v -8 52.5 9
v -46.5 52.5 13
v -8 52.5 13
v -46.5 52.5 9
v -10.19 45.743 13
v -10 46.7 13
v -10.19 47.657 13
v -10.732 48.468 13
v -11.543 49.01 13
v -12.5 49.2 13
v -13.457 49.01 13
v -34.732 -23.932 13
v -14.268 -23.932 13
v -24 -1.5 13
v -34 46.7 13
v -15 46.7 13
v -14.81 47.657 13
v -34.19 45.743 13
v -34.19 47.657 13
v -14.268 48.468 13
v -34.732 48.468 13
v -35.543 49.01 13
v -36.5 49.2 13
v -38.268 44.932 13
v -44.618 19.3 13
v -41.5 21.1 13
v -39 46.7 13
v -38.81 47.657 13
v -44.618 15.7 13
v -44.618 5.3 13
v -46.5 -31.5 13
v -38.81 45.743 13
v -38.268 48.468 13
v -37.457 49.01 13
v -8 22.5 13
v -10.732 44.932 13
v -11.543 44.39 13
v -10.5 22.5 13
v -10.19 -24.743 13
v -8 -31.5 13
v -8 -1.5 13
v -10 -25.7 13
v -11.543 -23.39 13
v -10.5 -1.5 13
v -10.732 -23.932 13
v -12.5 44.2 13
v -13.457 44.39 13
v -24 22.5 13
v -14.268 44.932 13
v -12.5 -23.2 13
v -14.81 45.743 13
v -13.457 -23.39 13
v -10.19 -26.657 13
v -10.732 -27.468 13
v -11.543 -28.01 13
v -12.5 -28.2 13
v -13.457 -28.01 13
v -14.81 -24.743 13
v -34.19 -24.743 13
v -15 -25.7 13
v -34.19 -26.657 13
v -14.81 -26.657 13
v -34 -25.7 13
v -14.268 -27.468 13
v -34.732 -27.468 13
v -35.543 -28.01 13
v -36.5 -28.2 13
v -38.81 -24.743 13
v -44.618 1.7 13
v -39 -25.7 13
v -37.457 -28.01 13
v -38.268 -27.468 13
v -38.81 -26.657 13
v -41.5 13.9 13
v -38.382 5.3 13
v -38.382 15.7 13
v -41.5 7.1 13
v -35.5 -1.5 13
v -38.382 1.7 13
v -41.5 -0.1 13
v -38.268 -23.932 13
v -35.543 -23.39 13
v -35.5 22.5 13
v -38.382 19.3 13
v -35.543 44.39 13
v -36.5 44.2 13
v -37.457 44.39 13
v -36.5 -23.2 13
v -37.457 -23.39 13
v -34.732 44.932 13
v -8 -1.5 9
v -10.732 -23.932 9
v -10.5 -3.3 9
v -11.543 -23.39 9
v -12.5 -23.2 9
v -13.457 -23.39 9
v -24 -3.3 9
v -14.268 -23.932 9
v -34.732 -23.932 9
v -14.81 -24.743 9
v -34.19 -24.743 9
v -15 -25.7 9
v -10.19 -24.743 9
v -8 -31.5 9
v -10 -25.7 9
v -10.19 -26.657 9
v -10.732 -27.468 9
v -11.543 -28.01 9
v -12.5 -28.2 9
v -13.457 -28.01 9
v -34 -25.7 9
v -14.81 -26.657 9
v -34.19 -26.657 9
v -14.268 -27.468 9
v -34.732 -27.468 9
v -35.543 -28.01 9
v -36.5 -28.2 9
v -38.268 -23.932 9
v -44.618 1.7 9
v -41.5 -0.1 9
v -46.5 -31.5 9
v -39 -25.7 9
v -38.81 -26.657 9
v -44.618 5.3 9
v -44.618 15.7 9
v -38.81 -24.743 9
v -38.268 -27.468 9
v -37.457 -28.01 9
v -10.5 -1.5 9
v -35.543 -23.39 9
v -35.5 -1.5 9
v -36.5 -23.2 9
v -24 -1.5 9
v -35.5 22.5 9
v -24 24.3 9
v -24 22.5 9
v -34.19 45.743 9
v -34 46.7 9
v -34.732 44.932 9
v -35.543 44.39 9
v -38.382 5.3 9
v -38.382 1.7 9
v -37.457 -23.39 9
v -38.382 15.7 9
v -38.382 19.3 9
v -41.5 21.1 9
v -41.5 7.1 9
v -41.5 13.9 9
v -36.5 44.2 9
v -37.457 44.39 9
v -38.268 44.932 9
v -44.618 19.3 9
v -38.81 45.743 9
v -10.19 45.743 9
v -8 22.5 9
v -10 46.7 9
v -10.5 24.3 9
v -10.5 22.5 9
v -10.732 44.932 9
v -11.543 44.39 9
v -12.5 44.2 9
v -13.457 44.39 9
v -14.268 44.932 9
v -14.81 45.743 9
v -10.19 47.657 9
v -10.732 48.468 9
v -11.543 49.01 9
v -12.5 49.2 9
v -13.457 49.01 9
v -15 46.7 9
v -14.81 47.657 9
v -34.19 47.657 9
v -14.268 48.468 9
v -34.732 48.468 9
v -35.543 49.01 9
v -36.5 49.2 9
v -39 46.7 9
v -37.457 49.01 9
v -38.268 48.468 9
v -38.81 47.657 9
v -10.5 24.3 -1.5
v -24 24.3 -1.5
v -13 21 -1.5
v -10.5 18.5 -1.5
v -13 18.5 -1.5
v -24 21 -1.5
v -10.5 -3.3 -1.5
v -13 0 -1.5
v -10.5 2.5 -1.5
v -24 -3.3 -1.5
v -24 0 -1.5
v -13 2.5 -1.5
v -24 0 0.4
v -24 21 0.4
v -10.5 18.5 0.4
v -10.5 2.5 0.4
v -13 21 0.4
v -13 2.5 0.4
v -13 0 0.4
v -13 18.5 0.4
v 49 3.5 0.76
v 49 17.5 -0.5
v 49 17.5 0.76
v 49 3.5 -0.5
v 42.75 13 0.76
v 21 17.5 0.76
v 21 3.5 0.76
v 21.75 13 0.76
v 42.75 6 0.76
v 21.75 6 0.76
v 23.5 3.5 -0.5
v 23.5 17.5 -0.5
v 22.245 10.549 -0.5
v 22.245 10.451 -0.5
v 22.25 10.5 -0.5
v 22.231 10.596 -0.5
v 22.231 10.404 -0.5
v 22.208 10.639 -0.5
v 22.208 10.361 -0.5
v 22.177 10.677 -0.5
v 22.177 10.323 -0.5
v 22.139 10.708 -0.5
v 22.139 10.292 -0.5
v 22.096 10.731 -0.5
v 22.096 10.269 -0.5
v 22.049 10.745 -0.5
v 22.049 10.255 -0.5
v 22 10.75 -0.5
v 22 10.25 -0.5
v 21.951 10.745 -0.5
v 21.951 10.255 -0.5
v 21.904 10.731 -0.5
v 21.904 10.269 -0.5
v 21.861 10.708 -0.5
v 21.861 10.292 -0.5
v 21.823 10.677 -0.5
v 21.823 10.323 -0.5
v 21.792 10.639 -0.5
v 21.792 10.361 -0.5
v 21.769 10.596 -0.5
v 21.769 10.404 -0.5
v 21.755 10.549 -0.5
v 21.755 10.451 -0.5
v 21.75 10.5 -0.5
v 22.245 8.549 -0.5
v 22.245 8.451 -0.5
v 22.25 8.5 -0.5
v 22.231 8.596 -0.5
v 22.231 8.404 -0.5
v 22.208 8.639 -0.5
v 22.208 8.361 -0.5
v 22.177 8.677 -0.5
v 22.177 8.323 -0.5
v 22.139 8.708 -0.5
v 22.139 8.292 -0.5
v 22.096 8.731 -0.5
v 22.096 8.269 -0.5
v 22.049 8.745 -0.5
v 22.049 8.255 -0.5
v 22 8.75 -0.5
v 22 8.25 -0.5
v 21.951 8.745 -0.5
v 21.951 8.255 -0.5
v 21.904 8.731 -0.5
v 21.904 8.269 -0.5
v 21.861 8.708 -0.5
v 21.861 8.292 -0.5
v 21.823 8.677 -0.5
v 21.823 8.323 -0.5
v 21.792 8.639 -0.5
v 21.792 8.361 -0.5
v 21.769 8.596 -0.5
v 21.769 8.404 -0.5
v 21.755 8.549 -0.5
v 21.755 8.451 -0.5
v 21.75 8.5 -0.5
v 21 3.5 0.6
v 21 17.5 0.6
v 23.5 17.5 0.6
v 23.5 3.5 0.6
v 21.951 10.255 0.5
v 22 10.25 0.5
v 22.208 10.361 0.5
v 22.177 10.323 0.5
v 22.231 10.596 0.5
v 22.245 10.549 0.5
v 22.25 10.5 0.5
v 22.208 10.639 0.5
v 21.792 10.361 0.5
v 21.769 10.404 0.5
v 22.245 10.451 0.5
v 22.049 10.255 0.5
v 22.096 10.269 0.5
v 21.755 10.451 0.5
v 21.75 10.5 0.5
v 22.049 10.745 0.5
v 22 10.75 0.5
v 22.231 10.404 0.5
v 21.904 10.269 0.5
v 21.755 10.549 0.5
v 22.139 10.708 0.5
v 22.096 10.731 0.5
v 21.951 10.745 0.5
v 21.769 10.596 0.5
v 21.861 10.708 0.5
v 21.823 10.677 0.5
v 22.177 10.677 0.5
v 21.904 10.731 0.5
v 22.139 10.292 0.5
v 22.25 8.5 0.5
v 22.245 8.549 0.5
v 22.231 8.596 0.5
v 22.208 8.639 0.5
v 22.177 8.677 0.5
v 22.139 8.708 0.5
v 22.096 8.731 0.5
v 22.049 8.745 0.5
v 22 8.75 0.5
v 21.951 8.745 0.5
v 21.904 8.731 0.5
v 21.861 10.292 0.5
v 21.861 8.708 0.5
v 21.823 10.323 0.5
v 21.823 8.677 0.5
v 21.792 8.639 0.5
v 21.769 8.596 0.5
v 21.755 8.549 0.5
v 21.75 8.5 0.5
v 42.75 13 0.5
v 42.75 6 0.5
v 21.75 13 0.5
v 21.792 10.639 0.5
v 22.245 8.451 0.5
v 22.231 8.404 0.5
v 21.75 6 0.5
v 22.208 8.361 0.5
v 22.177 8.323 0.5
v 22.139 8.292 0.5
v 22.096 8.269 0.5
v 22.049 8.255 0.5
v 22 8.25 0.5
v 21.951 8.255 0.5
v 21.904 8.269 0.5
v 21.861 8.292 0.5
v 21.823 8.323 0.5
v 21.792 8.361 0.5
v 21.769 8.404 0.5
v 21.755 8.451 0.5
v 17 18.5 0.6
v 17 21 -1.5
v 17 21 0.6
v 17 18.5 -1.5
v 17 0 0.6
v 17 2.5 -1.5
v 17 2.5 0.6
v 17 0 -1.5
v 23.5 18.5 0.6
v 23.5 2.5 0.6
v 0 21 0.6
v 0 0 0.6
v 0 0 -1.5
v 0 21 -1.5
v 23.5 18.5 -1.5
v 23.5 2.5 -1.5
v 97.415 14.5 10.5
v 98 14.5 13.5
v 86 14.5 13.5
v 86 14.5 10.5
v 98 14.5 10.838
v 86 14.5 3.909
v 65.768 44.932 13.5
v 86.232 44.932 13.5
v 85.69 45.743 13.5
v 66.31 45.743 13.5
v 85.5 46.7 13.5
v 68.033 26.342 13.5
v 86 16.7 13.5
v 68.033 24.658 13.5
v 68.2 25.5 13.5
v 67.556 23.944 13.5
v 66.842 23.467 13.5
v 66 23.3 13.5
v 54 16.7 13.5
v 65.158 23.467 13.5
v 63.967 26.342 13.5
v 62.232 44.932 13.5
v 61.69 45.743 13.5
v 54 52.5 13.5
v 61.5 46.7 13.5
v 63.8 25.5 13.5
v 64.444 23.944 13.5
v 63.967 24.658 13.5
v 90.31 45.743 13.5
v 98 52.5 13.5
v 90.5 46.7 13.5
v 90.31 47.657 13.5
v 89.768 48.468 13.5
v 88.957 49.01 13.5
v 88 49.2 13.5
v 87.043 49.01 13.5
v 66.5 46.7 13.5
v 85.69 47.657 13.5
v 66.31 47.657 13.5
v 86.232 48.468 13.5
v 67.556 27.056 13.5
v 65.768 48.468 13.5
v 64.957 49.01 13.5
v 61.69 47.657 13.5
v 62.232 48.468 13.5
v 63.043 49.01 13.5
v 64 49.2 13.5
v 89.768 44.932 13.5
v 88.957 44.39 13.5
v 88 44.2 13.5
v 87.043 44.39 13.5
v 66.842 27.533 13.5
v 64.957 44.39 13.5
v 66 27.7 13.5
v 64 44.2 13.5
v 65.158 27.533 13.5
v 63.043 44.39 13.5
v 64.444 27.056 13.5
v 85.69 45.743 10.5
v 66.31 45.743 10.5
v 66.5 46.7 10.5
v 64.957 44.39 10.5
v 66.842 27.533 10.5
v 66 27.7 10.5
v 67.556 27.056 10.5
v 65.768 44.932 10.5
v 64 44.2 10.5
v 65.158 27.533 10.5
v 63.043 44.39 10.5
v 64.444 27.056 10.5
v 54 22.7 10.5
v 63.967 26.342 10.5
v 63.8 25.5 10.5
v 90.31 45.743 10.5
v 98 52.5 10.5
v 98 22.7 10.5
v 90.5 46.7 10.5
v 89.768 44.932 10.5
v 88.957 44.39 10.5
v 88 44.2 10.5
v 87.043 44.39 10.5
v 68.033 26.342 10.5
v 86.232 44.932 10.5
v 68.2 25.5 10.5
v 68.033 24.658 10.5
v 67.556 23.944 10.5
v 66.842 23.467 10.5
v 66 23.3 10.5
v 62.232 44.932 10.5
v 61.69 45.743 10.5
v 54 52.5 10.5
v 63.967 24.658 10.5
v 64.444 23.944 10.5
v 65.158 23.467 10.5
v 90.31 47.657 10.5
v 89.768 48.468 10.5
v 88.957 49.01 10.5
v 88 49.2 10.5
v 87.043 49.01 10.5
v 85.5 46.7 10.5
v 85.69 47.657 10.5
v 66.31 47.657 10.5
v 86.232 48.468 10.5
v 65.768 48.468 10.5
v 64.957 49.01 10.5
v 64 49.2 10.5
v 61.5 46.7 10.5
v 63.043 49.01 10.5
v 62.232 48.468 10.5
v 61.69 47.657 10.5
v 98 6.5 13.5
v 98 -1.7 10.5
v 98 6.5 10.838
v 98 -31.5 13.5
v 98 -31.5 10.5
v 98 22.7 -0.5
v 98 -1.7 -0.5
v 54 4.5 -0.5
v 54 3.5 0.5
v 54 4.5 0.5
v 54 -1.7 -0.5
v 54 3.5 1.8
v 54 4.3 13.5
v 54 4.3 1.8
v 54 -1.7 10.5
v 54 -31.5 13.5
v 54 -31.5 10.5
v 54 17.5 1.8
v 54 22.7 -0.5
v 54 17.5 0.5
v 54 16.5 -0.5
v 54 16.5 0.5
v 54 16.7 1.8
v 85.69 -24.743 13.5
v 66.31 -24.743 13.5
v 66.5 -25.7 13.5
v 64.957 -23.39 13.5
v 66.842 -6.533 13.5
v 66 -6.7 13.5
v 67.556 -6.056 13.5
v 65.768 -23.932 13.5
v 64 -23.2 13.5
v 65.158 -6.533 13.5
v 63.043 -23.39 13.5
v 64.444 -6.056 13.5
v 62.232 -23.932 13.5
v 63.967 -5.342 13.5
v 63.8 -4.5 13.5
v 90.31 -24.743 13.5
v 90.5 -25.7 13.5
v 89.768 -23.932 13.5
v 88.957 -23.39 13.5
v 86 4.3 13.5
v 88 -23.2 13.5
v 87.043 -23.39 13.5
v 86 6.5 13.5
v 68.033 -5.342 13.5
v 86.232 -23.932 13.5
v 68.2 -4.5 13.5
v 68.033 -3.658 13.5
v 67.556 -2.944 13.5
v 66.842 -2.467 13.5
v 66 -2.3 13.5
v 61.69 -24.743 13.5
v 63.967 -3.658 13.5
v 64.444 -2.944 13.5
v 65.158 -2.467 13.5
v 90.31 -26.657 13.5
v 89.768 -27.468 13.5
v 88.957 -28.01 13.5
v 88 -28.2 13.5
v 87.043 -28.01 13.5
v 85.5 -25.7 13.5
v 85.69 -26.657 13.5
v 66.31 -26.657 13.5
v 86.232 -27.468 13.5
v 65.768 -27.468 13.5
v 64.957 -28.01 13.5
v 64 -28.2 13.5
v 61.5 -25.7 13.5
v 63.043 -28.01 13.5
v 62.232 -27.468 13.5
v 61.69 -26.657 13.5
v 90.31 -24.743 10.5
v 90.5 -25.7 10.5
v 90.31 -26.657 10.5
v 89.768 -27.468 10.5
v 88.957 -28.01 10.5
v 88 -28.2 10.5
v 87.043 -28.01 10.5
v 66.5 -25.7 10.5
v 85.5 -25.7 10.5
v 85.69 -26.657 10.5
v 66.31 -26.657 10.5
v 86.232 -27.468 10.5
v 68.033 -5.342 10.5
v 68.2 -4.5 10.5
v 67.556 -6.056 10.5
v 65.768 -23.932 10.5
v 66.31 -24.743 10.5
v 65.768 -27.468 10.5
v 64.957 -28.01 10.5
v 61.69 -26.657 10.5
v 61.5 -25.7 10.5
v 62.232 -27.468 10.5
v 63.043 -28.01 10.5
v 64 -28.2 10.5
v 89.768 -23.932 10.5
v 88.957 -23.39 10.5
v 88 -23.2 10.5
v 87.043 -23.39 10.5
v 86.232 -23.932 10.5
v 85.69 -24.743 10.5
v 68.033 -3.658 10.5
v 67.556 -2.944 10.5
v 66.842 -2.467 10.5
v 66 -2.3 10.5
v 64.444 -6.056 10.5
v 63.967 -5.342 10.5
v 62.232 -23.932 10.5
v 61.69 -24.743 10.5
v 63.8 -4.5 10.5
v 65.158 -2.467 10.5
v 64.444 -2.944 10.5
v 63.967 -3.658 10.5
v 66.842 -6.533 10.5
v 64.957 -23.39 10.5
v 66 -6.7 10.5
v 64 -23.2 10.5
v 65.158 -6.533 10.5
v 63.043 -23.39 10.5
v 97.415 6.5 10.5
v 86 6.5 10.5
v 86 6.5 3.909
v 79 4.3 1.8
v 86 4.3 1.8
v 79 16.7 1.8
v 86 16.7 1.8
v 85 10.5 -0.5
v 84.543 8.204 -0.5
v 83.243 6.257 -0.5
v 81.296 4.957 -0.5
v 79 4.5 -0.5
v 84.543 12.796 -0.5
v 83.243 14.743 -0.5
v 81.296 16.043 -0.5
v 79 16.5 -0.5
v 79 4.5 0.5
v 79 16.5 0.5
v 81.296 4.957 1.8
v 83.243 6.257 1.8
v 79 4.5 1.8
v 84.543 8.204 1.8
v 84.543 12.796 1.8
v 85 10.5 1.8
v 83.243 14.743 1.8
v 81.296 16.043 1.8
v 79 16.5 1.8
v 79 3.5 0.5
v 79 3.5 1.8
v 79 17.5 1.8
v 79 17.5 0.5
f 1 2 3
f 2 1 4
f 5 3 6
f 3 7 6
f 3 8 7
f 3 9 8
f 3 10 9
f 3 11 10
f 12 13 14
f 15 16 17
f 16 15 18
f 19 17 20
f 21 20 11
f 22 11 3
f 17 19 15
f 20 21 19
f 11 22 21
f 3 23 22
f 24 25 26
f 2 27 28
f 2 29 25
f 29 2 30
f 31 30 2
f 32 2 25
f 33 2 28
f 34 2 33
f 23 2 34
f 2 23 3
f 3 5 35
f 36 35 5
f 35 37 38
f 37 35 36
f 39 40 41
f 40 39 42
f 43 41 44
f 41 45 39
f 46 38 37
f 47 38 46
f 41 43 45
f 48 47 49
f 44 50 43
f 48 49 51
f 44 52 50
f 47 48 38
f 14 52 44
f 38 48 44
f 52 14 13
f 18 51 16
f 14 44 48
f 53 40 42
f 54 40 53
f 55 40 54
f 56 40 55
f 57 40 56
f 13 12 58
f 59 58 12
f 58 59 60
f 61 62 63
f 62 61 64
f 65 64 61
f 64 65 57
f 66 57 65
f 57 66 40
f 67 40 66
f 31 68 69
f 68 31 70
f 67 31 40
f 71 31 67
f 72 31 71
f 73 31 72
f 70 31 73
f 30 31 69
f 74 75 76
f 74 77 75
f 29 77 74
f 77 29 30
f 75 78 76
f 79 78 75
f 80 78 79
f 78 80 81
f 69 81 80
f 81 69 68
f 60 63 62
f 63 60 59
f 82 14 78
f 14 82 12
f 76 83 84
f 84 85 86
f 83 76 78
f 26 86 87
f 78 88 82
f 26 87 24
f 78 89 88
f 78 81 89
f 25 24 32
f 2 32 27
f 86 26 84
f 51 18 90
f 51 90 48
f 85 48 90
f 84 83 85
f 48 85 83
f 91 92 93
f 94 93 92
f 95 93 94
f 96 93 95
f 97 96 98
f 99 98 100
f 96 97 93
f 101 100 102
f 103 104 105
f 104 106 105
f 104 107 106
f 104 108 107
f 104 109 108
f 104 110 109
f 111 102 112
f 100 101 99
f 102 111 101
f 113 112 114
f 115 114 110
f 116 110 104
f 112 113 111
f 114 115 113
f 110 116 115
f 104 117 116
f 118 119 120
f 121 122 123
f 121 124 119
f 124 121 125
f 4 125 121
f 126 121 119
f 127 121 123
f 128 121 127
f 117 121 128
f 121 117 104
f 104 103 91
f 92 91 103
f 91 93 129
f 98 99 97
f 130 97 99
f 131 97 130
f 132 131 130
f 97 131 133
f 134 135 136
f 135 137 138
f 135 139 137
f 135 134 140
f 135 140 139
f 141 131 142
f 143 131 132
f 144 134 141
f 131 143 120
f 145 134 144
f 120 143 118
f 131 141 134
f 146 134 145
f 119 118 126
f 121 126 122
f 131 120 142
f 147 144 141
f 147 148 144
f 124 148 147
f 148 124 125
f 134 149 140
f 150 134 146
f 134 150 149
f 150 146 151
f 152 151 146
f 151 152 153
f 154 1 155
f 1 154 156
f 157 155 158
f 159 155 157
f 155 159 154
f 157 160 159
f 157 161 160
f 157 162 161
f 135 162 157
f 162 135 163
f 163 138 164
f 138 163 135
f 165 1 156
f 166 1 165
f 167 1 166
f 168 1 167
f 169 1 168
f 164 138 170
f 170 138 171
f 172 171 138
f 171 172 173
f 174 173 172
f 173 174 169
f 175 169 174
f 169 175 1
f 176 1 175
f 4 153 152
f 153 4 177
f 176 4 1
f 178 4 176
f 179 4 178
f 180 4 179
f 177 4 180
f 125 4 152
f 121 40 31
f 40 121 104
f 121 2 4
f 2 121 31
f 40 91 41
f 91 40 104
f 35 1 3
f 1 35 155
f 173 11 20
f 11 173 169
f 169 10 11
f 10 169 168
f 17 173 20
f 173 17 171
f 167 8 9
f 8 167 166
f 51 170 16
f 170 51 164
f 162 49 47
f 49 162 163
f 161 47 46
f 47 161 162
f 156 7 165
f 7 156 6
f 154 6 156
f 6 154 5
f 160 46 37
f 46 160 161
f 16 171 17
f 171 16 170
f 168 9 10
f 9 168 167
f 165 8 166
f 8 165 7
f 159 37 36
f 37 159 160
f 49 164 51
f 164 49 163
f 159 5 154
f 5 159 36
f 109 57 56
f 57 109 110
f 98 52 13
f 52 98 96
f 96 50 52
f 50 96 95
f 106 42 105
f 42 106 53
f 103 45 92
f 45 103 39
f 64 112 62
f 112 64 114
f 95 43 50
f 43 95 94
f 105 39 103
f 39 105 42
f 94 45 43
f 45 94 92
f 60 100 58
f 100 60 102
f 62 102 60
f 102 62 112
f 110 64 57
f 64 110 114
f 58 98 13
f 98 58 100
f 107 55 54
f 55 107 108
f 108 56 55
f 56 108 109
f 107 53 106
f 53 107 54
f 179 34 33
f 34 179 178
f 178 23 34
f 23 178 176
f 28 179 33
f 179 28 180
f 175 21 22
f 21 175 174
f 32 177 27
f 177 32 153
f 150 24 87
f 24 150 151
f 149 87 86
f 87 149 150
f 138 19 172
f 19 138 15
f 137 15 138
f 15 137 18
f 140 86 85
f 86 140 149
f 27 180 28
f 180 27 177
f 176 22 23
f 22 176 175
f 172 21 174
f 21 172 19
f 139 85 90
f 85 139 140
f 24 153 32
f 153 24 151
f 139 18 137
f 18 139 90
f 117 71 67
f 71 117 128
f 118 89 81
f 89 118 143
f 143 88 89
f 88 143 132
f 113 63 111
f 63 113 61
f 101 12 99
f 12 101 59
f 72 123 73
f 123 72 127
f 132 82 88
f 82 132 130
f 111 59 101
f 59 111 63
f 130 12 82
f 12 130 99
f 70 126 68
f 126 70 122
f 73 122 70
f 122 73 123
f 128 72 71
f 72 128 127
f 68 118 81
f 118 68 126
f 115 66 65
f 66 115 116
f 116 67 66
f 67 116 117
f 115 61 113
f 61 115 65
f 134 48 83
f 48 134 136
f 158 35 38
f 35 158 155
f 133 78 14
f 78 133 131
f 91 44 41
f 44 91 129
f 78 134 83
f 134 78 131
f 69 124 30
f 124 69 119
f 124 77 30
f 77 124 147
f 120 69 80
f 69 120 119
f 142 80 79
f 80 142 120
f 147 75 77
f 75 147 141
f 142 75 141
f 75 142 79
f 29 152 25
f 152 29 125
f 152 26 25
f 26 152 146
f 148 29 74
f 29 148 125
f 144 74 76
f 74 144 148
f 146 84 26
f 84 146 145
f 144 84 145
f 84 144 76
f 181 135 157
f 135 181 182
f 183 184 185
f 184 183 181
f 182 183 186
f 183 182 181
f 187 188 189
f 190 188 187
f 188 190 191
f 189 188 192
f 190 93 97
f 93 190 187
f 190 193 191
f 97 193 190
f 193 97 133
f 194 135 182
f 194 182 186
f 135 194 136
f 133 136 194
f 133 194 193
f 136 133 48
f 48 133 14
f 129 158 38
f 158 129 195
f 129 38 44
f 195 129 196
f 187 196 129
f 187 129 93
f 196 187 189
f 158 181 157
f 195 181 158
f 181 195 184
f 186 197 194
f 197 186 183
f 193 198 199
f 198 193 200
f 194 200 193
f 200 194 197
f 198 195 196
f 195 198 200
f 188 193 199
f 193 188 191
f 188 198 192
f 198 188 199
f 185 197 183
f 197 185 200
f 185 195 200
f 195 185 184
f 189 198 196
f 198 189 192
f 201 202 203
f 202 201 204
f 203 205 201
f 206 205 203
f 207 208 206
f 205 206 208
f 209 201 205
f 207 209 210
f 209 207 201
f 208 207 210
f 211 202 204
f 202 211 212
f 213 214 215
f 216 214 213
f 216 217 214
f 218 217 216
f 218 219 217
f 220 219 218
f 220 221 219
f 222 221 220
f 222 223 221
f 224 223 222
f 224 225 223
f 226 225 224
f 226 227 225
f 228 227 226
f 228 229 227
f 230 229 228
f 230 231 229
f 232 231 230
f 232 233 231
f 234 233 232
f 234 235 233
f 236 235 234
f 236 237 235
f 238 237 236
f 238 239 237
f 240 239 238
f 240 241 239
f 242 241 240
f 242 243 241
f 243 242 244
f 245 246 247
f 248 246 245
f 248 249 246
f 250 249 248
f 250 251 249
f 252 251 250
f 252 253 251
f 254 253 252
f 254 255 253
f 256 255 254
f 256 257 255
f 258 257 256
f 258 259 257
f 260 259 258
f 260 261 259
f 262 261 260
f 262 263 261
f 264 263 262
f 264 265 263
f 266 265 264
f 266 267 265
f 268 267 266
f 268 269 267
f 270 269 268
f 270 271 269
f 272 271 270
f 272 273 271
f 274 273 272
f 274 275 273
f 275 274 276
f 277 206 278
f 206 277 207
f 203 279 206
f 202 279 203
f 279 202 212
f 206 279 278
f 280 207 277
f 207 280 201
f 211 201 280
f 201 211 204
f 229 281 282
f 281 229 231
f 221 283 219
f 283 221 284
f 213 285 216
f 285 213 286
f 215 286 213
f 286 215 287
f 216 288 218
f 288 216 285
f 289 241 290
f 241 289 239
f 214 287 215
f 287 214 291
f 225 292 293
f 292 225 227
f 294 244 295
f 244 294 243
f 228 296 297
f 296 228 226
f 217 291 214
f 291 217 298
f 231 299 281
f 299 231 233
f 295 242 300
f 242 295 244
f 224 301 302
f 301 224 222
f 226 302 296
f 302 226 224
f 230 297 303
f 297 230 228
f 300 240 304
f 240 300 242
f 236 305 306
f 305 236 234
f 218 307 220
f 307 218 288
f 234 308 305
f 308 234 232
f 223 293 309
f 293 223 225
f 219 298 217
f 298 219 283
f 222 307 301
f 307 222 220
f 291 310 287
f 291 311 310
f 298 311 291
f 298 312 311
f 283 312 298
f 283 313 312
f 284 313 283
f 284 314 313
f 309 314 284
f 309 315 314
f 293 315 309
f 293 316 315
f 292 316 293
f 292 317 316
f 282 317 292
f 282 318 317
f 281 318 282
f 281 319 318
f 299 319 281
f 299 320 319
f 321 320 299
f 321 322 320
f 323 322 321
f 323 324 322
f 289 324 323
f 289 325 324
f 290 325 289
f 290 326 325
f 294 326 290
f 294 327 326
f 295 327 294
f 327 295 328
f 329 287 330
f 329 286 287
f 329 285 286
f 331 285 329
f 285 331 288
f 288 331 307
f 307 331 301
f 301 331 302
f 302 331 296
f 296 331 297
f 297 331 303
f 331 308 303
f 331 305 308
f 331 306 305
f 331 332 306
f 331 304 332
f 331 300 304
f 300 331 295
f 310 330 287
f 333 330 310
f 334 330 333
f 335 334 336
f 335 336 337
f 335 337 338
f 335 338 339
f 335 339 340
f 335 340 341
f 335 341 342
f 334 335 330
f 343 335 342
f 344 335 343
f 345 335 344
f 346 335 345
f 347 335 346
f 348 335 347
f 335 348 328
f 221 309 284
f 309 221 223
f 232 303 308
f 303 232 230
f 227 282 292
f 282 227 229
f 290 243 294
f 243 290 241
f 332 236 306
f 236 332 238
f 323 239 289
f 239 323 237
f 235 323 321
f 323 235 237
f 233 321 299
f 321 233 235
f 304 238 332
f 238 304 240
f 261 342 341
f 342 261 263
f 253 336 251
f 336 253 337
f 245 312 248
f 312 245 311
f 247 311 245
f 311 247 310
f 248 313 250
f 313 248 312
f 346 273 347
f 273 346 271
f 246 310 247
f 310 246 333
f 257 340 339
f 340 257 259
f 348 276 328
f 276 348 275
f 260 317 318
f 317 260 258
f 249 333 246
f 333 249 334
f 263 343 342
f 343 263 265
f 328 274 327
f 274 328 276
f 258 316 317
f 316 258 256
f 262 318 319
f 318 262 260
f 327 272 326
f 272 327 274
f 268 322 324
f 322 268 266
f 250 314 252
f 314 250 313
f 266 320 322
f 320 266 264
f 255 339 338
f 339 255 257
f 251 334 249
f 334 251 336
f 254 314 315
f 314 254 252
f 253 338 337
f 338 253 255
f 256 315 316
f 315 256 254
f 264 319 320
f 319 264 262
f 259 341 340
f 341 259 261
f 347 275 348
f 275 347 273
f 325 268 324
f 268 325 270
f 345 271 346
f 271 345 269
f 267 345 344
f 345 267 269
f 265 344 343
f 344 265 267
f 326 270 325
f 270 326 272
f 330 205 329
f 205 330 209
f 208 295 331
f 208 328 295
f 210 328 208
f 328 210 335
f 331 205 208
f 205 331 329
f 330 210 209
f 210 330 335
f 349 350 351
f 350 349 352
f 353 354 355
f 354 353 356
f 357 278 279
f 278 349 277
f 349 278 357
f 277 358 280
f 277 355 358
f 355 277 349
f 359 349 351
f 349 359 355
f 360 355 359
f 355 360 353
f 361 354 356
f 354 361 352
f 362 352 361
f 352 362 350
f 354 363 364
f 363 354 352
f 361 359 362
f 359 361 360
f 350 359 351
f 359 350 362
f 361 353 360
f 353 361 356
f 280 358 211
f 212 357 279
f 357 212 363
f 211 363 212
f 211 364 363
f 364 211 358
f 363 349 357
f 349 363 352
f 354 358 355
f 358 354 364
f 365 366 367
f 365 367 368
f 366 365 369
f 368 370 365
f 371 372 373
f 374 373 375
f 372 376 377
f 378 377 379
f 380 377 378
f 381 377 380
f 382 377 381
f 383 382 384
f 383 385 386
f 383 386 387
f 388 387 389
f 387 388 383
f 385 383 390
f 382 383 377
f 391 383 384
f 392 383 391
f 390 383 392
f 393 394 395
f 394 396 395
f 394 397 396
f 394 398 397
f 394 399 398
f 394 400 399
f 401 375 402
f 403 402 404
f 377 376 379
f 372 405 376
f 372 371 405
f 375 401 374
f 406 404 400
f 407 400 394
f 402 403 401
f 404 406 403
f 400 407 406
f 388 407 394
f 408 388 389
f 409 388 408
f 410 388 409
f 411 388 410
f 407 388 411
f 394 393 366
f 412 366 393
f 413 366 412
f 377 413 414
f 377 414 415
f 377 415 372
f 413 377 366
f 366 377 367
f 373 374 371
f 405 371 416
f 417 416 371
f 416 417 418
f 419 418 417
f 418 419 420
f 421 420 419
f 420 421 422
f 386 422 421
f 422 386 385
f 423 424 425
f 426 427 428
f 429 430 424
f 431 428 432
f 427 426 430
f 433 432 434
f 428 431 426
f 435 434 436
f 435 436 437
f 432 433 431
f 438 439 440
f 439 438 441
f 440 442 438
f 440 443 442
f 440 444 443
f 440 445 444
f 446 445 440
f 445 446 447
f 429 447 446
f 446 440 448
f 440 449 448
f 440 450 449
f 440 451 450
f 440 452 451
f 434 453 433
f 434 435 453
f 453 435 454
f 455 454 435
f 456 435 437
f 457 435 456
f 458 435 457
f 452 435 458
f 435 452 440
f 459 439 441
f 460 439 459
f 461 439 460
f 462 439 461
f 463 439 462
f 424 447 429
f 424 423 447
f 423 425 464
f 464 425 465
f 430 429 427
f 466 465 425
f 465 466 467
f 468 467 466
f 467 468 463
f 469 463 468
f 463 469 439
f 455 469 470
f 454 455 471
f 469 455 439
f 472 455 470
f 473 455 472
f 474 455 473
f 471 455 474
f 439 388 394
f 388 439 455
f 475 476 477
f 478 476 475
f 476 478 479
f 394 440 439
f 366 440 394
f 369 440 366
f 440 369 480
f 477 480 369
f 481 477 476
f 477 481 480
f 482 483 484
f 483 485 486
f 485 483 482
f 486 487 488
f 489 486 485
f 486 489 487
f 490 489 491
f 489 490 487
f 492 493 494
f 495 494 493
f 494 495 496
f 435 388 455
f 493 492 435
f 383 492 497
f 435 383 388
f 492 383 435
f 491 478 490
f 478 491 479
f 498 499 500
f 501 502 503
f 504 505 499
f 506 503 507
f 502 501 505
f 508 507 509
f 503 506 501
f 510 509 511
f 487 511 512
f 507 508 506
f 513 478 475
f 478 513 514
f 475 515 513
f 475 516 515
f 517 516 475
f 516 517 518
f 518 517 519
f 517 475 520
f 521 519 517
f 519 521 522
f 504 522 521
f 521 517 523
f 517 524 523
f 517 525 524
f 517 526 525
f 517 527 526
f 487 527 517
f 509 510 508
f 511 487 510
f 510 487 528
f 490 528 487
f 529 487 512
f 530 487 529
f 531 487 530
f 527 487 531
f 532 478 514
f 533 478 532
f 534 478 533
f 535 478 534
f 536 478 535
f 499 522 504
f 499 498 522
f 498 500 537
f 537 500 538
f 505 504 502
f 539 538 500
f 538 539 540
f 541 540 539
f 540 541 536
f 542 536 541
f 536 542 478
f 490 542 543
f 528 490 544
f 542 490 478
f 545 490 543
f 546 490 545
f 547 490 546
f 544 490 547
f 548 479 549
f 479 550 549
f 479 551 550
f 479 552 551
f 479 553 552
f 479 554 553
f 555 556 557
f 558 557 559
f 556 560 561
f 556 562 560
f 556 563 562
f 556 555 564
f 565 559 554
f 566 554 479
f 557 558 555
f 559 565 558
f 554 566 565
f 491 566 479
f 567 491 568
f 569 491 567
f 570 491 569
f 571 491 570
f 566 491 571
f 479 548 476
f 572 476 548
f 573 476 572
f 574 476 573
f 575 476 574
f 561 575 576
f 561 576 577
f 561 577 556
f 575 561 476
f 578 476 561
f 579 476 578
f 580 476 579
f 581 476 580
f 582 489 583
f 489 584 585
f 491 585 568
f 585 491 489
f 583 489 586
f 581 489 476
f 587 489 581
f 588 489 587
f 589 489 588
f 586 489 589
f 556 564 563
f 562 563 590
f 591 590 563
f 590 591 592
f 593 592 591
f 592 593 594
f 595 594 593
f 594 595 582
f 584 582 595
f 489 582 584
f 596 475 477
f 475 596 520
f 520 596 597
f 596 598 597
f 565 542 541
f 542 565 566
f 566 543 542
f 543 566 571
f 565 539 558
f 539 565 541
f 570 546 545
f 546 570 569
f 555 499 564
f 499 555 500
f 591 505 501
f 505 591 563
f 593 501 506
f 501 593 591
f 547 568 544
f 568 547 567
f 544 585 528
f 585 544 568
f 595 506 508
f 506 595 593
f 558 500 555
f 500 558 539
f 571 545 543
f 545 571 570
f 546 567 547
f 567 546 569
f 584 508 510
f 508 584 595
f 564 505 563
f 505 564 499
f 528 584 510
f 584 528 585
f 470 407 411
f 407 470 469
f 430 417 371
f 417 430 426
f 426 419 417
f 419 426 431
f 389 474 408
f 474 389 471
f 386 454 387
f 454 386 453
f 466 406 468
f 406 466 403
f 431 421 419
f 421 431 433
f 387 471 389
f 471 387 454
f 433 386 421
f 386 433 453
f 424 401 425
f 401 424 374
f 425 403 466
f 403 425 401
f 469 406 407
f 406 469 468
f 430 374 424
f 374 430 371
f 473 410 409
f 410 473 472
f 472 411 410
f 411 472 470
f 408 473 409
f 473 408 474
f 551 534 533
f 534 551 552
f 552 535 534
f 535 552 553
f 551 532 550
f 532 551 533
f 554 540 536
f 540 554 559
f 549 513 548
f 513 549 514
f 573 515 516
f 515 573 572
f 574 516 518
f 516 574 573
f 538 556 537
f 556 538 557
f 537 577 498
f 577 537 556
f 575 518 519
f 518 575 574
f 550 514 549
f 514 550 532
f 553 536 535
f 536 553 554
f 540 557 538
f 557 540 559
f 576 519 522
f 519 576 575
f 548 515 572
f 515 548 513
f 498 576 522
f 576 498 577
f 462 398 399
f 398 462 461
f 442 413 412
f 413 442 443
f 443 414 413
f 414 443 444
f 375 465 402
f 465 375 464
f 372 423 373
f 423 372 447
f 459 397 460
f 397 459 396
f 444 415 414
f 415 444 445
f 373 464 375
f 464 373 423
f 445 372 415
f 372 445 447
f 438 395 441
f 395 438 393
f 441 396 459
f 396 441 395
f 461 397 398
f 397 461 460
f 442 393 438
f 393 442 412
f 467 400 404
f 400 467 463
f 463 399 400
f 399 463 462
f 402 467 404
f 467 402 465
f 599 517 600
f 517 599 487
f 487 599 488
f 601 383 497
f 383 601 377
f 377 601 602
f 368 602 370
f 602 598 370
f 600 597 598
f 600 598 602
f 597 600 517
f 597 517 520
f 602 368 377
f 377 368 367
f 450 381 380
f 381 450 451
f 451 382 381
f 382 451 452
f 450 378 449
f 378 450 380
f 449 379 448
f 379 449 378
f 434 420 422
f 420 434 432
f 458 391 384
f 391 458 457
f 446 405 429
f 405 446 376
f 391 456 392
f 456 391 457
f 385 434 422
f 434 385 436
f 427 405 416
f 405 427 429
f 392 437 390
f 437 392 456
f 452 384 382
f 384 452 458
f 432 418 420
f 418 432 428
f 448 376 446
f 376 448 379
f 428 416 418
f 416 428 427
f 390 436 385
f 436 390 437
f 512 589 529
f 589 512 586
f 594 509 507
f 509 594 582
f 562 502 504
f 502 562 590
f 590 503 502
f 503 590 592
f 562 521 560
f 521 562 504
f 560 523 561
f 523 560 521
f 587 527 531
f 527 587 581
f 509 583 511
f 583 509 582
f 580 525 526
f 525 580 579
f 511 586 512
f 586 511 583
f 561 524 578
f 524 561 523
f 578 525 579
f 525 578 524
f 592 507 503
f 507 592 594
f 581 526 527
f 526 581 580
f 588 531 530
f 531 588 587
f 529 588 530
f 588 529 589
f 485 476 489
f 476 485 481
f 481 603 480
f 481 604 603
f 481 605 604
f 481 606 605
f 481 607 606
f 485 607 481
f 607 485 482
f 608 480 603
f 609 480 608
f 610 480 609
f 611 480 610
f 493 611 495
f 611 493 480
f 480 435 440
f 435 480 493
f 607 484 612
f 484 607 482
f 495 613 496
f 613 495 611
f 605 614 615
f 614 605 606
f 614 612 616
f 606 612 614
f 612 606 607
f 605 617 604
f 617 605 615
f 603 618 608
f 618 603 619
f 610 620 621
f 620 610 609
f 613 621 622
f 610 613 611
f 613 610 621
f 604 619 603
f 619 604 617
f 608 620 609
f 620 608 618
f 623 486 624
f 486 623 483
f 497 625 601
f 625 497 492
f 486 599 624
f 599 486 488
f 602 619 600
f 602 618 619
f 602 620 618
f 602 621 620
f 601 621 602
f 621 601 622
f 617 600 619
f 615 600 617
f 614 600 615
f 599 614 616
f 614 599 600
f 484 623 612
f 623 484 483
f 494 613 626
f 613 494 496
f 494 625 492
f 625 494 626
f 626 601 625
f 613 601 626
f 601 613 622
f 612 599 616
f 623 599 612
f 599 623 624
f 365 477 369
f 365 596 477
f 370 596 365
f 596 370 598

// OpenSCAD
//MiSeq chip
module MiSeqChip(){
color("red")
    translate([0,0,-1])
difference(){
    cube([28,14,1.26]);
    translate([1,7,0])
        cylinder(r=0.25,h=1,$fn=32);
    translate([1,5,0])
        cylinder(r=0.25,h=1,$fn=32);
    translate([0.75,2.5,1])
        cube([21,7,1.26]);
}}

//MiSeq gasket
module MiSeqGasket(){
    color("blue")
difference(){
union(){
    cube([17,21,2.1]);
    translate([0,2.5,0])
        cube([23.5,16,2.1]);
}
translate([21,3.5,1])
    cube([2.5,14,1.1]);
}}

module MiSeqPressurePlate(){
    translate([0,30,0])
union(){
    difference() {
        translate([-42,1.5,0])        //base
            cube([84,38.5,4]);
        //screw openings
        translate([36.2,6,0])
            cylinder(r=2.5,h=6,$fn=16);
        translate([-36.2,6,0])
            cylinder(r=2.5,h=6,$fn=16);
        translate([36.2,30,0])
            cylinder(r=2.5,h=6,$fn=16);
        translate([-36.2,30,0])
            cylinder(r=2.5,h=6,$fn=16);
        //interface opening
        translate([-12,0,0]) 
            cube([24,29,6]);
    //fitting holes 
        translate([-7,35,0])         
            cylinder(r=3.6,h=6,$fn=6);
        translate([7,35,0])
            cylinder(r=3.6,h=6,$fn=6);
    }
    //gasket holder  
    difference(){
        //base  
        translate([-13.8,4,-10.5])  
            cube([27.6,13.5,14.5]);
        //gasket slot
        translate([-10.5,6.5,-10.5])
            cube([21,17.5,1.9]);
        translate([-8,1.5,-10.5])
            cube([16,17.5,1.9]);

        }
}}

//MiSeqCradle
module MiSeqCradle (){
color ("purple")
    translate([0,30,0])
union() {
    difference() {
        union(){
            translate([-42,0,8])      //base left
                cube([38,44,3]);
            translate([4,0,8])        //base right
                cube([38,44,3]);
            }
        translate([36.2,10,7])        //screw openings
            cylinder(r=2.5,h=6,$fn=16);
        translate([-36.2,10,7])
            cylinder(r=2.5,h=6,$fn=16);
        translate([36.2,34,7])
            cylinder(r=2.5,h=6,$fn=16);
        translate([-36.2,34,7])
            cylinder(r=2.5,h=6,$fn=16);
        translate([-6.2,0,6])       //prism opening
            cube([12.4,32,9]);
        translate([-15,12,7])       //heater screw openings
            cylinder(r=2.2,h=6,$fn=16);
        translate([15,12,7])       
            cylinder(r=2.2,h=6,$fn=16);   
    }
    difference() {
        translate([-12.2,0,-3])
            cube([24.4,44,12]);
        translate([-6,0,-4])        //scope opening
            cube([12,25,12]);
        translate([0,25,-4])
            cylinder(r=6,h=6,$fn=16);
        translate([-7,0,-2]) 
            cube([14,25,1.3]);      //chip notch
        translate([-6.2,0,-0.7]) 
            cube([12.4,32,9.7]);    //prism opening
        translate([-4,28,-0.9])     //top laser bevel
            rotate([30,0,0]){
                cube([8,35,7.7]);}
        }  
}}

translate([23.5,10.5,9])
    rotate([0,0,90]){
    MiSeqPressurePlate();}
translate([21,3.5,0.5])
    MiSeqChip();
translate([0,0,-1.5])
    MiSeqGasket();
translate([24,10.5,2.5])
    rotate([0,0,-90]){
        MiSeqCradle();}
